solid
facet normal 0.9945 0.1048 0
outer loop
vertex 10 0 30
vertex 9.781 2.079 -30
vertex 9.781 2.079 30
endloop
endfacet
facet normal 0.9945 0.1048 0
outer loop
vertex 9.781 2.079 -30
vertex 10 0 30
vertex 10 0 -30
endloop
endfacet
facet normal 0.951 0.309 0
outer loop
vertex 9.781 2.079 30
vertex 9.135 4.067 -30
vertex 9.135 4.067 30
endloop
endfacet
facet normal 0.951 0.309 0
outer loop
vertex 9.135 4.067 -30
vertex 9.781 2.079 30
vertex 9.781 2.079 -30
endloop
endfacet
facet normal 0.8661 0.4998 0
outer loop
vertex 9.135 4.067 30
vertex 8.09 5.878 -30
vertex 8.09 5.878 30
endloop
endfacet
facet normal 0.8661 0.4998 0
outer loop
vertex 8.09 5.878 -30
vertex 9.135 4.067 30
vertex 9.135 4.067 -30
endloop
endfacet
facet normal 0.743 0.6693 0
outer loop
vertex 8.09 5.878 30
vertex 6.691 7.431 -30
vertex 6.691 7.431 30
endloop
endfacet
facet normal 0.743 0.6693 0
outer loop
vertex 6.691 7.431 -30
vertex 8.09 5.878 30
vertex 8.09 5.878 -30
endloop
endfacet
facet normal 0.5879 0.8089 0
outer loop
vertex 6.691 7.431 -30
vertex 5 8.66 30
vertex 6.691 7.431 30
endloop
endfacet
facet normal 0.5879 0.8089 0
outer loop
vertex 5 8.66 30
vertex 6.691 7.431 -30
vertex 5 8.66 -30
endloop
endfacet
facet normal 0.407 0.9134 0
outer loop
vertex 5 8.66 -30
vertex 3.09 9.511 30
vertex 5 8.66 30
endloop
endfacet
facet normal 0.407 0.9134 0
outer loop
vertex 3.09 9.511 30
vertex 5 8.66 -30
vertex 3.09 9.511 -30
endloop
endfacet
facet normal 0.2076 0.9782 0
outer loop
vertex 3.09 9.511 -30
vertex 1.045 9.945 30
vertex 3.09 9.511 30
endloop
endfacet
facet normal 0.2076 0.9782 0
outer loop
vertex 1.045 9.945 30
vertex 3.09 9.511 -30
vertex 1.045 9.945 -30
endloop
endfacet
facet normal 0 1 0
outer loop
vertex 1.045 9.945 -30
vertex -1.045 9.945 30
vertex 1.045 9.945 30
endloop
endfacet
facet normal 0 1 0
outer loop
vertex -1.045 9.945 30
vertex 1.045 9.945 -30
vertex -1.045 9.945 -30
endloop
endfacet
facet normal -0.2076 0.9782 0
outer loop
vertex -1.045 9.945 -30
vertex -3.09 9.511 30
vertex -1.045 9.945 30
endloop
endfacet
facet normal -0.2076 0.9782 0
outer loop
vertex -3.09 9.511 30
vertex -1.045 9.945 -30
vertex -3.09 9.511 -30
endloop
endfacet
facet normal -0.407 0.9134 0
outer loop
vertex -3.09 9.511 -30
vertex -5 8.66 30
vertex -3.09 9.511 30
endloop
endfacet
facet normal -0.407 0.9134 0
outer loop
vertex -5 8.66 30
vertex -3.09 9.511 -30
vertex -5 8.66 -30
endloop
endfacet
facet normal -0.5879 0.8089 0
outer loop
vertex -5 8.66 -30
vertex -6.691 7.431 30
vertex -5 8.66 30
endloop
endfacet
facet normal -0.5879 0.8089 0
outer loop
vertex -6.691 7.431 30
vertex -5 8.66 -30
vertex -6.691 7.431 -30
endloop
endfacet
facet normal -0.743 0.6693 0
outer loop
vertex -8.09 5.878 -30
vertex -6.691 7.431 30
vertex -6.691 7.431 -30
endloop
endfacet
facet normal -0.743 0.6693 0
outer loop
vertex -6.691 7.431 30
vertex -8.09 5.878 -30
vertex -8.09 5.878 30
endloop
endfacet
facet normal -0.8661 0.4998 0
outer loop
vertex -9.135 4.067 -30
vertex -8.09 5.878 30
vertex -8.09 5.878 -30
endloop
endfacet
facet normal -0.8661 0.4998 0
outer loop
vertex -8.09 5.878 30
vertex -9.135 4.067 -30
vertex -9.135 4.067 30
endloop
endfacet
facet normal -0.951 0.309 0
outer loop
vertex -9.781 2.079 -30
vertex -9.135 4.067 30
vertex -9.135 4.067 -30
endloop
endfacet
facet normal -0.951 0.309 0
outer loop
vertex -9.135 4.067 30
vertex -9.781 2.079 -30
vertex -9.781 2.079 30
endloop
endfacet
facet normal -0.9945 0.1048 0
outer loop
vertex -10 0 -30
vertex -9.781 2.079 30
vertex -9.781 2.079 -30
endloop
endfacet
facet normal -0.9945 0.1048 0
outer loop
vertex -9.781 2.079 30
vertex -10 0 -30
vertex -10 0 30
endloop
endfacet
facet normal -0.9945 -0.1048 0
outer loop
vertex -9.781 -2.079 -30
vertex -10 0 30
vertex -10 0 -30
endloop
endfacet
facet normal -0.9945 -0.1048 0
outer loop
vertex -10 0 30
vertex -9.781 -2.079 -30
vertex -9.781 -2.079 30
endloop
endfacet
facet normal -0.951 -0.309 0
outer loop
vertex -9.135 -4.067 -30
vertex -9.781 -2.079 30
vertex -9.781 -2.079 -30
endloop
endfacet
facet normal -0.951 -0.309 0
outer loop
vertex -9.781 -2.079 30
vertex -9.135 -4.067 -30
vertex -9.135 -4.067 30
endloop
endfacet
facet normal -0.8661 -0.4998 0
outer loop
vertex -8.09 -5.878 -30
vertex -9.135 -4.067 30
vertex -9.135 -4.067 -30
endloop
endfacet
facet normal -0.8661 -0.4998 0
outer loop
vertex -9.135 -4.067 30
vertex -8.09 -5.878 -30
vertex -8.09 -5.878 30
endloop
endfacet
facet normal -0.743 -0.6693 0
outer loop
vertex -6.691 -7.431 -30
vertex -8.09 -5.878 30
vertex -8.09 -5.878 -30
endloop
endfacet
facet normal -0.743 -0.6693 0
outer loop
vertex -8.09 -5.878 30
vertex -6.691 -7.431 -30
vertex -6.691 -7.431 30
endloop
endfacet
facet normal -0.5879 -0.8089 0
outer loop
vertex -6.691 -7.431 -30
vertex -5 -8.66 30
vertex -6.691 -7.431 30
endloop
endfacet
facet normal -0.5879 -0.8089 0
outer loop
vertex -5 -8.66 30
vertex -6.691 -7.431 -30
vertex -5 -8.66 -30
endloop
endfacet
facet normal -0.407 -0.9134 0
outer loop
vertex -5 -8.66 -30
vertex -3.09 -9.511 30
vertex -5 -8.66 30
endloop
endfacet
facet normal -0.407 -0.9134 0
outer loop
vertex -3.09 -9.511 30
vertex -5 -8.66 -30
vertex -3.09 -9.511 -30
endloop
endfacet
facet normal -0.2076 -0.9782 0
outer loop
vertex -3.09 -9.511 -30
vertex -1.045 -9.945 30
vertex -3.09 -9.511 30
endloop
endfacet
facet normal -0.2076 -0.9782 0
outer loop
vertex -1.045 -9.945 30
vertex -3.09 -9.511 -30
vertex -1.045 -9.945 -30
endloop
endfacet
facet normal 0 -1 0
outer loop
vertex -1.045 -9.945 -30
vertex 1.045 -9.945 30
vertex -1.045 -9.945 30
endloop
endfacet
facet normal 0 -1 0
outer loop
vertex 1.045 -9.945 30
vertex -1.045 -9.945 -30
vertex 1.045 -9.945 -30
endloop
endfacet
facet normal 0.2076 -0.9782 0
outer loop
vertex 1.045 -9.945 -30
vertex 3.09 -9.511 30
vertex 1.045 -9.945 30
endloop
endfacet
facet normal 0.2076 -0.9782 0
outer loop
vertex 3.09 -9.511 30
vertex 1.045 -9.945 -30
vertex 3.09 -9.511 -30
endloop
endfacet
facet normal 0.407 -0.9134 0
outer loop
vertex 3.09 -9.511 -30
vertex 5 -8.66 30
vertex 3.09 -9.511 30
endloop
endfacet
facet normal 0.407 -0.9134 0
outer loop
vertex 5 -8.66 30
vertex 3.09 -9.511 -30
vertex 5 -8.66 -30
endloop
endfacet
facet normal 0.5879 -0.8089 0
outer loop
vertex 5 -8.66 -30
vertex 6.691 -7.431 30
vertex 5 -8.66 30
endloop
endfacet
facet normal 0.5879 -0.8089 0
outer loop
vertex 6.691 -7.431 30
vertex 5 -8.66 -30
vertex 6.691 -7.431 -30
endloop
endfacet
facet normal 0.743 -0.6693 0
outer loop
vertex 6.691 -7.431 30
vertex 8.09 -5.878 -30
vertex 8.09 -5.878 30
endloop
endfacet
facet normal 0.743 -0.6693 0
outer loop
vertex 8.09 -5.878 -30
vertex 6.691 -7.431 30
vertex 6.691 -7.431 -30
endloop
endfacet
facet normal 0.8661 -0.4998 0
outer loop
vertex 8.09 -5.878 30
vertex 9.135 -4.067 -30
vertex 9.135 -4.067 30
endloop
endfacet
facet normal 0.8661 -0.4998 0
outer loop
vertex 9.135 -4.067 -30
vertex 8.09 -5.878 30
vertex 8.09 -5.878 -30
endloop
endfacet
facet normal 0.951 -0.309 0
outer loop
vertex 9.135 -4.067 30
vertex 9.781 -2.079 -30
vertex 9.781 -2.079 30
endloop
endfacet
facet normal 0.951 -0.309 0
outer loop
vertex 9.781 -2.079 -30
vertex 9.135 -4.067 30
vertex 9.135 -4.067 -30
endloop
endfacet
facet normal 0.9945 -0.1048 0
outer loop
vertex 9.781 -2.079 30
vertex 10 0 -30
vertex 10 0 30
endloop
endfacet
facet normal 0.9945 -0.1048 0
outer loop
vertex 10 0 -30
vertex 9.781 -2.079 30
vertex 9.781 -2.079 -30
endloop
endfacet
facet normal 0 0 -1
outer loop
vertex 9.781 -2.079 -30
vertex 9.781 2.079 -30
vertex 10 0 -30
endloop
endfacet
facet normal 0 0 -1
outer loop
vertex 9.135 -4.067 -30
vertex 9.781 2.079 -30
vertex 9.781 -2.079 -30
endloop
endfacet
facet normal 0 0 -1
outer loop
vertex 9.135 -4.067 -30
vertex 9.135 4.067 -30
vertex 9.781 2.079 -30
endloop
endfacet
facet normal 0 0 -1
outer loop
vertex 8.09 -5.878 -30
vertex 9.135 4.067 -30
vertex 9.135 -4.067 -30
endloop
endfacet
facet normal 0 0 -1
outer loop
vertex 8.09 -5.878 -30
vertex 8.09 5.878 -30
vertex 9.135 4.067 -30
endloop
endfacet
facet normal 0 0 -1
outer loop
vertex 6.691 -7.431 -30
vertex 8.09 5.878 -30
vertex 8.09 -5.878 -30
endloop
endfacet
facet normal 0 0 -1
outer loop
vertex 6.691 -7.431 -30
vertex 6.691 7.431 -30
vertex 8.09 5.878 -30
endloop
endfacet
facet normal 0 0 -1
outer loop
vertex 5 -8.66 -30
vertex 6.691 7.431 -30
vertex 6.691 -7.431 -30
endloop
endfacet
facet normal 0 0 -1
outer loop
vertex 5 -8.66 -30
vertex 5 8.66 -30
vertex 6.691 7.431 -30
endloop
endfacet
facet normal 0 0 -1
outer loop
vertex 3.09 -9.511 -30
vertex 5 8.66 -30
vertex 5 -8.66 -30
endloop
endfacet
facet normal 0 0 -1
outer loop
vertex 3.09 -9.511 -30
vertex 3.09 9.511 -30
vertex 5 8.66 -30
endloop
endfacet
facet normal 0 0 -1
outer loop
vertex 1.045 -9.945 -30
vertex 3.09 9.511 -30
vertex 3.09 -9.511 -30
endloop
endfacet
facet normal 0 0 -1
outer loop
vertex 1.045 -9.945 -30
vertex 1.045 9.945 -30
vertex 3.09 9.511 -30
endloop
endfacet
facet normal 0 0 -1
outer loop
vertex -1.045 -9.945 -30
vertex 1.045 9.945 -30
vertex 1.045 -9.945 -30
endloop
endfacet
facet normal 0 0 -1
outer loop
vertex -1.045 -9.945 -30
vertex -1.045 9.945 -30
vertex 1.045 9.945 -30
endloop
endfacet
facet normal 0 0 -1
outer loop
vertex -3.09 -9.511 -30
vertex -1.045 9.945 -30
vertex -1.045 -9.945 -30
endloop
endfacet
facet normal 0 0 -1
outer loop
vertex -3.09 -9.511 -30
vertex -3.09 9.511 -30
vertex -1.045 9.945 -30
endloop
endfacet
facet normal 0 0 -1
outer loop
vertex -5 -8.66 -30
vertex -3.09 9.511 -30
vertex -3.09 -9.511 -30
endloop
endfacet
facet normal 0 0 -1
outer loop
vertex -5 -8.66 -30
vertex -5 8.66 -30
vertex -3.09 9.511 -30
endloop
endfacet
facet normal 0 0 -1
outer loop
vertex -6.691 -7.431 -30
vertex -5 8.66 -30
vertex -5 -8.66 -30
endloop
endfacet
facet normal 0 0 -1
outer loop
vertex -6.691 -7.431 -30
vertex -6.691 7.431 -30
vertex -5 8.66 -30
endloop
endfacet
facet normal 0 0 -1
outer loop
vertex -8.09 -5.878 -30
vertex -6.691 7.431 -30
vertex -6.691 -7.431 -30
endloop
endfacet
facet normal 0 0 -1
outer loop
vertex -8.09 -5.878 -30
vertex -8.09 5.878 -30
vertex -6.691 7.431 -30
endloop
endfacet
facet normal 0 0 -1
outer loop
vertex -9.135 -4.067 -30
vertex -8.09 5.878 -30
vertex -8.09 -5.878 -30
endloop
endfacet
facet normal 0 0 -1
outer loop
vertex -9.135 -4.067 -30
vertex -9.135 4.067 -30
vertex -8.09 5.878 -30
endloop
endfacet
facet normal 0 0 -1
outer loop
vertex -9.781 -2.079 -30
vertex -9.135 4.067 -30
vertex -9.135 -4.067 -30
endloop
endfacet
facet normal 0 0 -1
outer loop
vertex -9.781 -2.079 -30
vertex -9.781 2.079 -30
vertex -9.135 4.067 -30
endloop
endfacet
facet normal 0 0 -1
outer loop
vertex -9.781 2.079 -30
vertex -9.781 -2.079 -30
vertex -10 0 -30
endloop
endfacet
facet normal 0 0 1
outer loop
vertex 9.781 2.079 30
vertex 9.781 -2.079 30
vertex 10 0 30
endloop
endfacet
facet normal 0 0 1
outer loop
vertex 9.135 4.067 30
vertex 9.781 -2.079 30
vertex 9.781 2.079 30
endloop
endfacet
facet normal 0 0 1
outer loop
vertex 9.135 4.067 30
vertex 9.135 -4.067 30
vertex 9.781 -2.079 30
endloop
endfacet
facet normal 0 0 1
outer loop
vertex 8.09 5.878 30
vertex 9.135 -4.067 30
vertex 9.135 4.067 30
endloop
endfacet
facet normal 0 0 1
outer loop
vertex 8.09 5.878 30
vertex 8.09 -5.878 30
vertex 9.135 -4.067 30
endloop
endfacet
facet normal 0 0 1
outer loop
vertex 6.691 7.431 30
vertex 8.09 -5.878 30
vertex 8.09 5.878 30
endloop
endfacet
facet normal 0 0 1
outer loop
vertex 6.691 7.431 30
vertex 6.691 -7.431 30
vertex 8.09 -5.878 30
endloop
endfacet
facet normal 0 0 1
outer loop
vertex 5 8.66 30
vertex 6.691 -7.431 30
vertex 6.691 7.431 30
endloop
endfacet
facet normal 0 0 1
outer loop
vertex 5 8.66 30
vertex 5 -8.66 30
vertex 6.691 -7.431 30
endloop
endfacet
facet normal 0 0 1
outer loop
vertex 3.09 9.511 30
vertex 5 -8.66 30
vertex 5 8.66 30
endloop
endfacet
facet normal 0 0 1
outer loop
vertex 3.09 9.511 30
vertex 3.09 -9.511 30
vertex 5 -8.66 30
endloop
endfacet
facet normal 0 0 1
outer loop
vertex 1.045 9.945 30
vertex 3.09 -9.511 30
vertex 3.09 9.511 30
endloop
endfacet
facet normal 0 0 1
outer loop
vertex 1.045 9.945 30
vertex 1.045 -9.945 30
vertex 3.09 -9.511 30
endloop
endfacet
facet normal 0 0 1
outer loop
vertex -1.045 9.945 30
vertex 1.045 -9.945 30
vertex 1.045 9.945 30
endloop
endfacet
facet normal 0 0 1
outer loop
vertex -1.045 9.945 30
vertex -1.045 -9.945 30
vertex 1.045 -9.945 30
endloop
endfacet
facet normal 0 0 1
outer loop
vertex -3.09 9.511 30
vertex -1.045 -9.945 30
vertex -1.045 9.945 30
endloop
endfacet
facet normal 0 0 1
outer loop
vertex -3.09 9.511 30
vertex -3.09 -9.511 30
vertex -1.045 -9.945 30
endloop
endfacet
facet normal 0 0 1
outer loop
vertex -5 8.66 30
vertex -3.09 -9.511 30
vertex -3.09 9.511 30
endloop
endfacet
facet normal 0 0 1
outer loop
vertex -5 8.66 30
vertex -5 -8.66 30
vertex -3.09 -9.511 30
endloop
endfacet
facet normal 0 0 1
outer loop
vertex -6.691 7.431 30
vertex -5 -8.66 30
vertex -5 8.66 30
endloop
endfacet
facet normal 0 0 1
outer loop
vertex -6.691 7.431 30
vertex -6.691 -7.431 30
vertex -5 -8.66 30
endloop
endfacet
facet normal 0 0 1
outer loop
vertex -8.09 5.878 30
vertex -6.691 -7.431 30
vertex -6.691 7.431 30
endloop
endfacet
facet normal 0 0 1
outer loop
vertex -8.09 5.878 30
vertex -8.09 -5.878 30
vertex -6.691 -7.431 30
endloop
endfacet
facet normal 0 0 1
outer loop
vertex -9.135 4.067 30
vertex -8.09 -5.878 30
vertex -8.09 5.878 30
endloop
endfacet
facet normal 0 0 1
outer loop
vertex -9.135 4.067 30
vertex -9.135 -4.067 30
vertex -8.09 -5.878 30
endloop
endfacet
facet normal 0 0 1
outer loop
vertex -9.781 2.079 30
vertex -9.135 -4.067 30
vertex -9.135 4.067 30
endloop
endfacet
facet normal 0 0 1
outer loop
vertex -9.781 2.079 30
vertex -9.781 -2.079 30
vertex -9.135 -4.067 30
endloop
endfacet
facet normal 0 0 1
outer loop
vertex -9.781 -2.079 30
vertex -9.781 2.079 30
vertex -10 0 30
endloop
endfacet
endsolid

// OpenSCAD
// Parameters for the central shaft
shaft_diameter = 20; // Diameter of the central shaft
shaft_length = 60;   // Length of the central shaft

// Central Shaft
module central_shaft() {
    cylinder(d=shaft_diameter, h=shaft_length, center=true);
}

// Render the central shaft
translate([0, 0, 0]) {
    central_shaft();
}
